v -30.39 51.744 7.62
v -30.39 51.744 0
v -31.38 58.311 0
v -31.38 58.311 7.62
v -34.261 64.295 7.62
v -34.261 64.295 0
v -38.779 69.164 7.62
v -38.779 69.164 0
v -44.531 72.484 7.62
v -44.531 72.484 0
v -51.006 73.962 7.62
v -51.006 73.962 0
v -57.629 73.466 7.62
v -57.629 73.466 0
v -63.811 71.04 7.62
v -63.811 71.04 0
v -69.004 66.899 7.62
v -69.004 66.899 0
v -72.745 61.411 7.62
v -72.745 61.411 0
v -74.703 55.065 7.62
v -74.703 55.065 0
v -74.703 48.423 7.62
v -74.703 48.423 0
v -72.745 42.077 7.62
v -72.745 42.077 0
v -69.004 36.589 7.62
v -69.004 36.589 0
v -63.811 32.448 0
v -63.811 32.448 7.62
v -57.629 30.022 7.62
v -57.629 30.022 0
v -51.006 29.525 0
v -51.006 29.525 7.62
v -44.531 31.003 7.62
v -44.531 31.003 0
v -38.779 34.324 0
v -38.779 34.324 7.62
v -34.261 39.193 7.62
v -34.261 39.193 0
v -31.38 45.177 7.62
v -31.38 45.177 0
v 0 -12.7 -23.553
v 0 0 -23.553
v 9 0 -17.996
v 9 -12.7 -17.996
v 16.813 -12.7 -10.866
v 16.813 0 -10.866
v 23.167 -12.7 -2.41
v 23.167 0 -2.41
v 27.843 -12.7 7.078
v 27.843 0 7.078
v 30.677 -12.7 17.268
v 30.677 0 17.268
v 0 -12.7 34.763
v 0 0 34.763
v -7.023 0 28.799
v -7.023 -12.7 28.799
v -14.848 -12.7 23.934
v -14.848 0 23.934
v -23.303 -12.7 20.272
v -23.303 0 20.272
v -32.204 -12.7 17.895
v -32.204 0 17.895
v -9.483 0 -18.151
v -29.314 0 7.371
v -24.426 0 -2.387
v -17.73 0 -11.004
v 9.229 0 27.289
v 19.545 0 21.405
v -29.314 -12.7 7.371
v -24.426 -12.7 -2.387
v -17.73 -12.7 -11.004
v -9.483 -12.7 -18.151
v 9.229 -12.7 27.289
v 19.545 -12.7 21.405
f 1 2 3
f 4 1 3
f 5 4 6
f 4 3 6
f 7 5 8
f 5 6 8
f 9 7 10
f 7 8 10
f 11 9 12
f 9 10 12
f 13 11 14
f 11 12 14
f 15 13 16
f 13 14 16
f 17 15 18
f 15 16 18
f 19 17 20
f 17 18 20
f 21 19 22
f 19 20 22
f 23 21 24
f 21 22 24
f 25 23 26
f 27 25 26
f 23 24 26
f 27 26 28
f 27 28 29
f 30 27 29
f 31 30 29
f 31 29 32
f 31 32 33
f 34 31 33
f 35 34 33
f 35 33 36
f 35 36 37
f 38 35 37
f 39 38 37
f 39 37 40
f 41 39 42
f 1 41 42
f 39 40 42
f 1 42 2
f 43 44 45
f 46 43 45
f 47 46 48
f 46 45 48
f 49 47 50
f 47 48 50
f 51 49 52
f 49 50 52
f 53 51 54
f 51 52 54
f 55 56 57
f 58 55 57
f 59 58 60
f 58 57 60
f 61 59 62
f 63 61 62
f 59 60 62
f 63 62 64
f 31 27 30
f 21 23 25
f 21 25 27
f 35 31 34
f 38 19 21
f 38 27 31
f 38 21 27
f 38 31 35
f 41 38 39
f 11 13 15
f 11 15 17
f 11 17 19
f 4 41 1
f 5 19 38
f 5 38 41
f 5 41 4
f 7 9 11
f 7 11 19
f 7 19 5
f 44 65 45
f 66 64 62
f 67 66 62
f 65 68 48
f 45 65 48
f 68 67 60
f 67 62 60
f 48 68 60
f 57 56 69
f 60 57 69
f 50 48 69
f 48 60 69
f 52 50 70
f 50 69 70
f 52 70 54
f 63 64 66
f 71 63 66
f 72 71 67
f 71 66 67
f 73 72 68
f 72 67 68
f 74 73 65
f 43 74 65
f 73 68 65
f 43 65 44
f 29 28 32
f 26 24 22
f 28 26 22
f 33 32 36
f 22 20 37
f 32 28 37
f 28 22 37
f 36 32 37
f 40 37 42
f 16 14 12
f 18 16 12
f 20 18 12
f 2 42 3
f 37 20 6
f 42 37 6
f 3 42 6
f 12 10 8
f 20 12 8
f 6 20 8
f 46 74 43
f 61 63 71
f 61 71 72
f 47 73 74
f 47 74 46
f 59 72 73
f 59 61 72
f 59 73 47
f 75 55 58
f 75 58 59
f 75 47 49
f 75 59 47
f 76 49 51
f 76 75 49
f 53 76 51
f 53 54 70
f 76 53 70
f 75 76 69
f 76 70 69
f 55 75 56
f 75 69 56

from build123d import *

# Parameters (mm, degrees)
F1_DEPTH = 12.7
F2_R     = 22.280742
F3_DEPTH = 7.62


with BuildPart() as f1:
    # F0 (on Front) → F1 (new body)
    with BuildSketch(Plane.XZ):
        with BuildLine():
            ThreePointArc((0, 34.763172), (-14.847709, 23.93392), (-32.204406, 17.894694))
            ThreePointArc((-32.204406, 17.894694), (-21.289972, -6.859974), (0, -23.552952))
            ThreePointArc((0, -23.552952), (20.187463, -6.78629), (30.676963, 17.268335))
            ThreePointArc((30.676963, 17.268335), (14.26725, 24.137364), (0, 34.763172))
        make_face()
    extrude(amount=F1_DEPTH)


with BuildPart() as f3:
    # F2 (on Top) → F3 (new body)
    with BuildSketch(Plane.XY):
        with Locations((-52.670673, 51.743921)):
            Circle(F2_R)
    extrude(amount=F3_DEPTH)


solid = Compound([f1.part, f3.part])
